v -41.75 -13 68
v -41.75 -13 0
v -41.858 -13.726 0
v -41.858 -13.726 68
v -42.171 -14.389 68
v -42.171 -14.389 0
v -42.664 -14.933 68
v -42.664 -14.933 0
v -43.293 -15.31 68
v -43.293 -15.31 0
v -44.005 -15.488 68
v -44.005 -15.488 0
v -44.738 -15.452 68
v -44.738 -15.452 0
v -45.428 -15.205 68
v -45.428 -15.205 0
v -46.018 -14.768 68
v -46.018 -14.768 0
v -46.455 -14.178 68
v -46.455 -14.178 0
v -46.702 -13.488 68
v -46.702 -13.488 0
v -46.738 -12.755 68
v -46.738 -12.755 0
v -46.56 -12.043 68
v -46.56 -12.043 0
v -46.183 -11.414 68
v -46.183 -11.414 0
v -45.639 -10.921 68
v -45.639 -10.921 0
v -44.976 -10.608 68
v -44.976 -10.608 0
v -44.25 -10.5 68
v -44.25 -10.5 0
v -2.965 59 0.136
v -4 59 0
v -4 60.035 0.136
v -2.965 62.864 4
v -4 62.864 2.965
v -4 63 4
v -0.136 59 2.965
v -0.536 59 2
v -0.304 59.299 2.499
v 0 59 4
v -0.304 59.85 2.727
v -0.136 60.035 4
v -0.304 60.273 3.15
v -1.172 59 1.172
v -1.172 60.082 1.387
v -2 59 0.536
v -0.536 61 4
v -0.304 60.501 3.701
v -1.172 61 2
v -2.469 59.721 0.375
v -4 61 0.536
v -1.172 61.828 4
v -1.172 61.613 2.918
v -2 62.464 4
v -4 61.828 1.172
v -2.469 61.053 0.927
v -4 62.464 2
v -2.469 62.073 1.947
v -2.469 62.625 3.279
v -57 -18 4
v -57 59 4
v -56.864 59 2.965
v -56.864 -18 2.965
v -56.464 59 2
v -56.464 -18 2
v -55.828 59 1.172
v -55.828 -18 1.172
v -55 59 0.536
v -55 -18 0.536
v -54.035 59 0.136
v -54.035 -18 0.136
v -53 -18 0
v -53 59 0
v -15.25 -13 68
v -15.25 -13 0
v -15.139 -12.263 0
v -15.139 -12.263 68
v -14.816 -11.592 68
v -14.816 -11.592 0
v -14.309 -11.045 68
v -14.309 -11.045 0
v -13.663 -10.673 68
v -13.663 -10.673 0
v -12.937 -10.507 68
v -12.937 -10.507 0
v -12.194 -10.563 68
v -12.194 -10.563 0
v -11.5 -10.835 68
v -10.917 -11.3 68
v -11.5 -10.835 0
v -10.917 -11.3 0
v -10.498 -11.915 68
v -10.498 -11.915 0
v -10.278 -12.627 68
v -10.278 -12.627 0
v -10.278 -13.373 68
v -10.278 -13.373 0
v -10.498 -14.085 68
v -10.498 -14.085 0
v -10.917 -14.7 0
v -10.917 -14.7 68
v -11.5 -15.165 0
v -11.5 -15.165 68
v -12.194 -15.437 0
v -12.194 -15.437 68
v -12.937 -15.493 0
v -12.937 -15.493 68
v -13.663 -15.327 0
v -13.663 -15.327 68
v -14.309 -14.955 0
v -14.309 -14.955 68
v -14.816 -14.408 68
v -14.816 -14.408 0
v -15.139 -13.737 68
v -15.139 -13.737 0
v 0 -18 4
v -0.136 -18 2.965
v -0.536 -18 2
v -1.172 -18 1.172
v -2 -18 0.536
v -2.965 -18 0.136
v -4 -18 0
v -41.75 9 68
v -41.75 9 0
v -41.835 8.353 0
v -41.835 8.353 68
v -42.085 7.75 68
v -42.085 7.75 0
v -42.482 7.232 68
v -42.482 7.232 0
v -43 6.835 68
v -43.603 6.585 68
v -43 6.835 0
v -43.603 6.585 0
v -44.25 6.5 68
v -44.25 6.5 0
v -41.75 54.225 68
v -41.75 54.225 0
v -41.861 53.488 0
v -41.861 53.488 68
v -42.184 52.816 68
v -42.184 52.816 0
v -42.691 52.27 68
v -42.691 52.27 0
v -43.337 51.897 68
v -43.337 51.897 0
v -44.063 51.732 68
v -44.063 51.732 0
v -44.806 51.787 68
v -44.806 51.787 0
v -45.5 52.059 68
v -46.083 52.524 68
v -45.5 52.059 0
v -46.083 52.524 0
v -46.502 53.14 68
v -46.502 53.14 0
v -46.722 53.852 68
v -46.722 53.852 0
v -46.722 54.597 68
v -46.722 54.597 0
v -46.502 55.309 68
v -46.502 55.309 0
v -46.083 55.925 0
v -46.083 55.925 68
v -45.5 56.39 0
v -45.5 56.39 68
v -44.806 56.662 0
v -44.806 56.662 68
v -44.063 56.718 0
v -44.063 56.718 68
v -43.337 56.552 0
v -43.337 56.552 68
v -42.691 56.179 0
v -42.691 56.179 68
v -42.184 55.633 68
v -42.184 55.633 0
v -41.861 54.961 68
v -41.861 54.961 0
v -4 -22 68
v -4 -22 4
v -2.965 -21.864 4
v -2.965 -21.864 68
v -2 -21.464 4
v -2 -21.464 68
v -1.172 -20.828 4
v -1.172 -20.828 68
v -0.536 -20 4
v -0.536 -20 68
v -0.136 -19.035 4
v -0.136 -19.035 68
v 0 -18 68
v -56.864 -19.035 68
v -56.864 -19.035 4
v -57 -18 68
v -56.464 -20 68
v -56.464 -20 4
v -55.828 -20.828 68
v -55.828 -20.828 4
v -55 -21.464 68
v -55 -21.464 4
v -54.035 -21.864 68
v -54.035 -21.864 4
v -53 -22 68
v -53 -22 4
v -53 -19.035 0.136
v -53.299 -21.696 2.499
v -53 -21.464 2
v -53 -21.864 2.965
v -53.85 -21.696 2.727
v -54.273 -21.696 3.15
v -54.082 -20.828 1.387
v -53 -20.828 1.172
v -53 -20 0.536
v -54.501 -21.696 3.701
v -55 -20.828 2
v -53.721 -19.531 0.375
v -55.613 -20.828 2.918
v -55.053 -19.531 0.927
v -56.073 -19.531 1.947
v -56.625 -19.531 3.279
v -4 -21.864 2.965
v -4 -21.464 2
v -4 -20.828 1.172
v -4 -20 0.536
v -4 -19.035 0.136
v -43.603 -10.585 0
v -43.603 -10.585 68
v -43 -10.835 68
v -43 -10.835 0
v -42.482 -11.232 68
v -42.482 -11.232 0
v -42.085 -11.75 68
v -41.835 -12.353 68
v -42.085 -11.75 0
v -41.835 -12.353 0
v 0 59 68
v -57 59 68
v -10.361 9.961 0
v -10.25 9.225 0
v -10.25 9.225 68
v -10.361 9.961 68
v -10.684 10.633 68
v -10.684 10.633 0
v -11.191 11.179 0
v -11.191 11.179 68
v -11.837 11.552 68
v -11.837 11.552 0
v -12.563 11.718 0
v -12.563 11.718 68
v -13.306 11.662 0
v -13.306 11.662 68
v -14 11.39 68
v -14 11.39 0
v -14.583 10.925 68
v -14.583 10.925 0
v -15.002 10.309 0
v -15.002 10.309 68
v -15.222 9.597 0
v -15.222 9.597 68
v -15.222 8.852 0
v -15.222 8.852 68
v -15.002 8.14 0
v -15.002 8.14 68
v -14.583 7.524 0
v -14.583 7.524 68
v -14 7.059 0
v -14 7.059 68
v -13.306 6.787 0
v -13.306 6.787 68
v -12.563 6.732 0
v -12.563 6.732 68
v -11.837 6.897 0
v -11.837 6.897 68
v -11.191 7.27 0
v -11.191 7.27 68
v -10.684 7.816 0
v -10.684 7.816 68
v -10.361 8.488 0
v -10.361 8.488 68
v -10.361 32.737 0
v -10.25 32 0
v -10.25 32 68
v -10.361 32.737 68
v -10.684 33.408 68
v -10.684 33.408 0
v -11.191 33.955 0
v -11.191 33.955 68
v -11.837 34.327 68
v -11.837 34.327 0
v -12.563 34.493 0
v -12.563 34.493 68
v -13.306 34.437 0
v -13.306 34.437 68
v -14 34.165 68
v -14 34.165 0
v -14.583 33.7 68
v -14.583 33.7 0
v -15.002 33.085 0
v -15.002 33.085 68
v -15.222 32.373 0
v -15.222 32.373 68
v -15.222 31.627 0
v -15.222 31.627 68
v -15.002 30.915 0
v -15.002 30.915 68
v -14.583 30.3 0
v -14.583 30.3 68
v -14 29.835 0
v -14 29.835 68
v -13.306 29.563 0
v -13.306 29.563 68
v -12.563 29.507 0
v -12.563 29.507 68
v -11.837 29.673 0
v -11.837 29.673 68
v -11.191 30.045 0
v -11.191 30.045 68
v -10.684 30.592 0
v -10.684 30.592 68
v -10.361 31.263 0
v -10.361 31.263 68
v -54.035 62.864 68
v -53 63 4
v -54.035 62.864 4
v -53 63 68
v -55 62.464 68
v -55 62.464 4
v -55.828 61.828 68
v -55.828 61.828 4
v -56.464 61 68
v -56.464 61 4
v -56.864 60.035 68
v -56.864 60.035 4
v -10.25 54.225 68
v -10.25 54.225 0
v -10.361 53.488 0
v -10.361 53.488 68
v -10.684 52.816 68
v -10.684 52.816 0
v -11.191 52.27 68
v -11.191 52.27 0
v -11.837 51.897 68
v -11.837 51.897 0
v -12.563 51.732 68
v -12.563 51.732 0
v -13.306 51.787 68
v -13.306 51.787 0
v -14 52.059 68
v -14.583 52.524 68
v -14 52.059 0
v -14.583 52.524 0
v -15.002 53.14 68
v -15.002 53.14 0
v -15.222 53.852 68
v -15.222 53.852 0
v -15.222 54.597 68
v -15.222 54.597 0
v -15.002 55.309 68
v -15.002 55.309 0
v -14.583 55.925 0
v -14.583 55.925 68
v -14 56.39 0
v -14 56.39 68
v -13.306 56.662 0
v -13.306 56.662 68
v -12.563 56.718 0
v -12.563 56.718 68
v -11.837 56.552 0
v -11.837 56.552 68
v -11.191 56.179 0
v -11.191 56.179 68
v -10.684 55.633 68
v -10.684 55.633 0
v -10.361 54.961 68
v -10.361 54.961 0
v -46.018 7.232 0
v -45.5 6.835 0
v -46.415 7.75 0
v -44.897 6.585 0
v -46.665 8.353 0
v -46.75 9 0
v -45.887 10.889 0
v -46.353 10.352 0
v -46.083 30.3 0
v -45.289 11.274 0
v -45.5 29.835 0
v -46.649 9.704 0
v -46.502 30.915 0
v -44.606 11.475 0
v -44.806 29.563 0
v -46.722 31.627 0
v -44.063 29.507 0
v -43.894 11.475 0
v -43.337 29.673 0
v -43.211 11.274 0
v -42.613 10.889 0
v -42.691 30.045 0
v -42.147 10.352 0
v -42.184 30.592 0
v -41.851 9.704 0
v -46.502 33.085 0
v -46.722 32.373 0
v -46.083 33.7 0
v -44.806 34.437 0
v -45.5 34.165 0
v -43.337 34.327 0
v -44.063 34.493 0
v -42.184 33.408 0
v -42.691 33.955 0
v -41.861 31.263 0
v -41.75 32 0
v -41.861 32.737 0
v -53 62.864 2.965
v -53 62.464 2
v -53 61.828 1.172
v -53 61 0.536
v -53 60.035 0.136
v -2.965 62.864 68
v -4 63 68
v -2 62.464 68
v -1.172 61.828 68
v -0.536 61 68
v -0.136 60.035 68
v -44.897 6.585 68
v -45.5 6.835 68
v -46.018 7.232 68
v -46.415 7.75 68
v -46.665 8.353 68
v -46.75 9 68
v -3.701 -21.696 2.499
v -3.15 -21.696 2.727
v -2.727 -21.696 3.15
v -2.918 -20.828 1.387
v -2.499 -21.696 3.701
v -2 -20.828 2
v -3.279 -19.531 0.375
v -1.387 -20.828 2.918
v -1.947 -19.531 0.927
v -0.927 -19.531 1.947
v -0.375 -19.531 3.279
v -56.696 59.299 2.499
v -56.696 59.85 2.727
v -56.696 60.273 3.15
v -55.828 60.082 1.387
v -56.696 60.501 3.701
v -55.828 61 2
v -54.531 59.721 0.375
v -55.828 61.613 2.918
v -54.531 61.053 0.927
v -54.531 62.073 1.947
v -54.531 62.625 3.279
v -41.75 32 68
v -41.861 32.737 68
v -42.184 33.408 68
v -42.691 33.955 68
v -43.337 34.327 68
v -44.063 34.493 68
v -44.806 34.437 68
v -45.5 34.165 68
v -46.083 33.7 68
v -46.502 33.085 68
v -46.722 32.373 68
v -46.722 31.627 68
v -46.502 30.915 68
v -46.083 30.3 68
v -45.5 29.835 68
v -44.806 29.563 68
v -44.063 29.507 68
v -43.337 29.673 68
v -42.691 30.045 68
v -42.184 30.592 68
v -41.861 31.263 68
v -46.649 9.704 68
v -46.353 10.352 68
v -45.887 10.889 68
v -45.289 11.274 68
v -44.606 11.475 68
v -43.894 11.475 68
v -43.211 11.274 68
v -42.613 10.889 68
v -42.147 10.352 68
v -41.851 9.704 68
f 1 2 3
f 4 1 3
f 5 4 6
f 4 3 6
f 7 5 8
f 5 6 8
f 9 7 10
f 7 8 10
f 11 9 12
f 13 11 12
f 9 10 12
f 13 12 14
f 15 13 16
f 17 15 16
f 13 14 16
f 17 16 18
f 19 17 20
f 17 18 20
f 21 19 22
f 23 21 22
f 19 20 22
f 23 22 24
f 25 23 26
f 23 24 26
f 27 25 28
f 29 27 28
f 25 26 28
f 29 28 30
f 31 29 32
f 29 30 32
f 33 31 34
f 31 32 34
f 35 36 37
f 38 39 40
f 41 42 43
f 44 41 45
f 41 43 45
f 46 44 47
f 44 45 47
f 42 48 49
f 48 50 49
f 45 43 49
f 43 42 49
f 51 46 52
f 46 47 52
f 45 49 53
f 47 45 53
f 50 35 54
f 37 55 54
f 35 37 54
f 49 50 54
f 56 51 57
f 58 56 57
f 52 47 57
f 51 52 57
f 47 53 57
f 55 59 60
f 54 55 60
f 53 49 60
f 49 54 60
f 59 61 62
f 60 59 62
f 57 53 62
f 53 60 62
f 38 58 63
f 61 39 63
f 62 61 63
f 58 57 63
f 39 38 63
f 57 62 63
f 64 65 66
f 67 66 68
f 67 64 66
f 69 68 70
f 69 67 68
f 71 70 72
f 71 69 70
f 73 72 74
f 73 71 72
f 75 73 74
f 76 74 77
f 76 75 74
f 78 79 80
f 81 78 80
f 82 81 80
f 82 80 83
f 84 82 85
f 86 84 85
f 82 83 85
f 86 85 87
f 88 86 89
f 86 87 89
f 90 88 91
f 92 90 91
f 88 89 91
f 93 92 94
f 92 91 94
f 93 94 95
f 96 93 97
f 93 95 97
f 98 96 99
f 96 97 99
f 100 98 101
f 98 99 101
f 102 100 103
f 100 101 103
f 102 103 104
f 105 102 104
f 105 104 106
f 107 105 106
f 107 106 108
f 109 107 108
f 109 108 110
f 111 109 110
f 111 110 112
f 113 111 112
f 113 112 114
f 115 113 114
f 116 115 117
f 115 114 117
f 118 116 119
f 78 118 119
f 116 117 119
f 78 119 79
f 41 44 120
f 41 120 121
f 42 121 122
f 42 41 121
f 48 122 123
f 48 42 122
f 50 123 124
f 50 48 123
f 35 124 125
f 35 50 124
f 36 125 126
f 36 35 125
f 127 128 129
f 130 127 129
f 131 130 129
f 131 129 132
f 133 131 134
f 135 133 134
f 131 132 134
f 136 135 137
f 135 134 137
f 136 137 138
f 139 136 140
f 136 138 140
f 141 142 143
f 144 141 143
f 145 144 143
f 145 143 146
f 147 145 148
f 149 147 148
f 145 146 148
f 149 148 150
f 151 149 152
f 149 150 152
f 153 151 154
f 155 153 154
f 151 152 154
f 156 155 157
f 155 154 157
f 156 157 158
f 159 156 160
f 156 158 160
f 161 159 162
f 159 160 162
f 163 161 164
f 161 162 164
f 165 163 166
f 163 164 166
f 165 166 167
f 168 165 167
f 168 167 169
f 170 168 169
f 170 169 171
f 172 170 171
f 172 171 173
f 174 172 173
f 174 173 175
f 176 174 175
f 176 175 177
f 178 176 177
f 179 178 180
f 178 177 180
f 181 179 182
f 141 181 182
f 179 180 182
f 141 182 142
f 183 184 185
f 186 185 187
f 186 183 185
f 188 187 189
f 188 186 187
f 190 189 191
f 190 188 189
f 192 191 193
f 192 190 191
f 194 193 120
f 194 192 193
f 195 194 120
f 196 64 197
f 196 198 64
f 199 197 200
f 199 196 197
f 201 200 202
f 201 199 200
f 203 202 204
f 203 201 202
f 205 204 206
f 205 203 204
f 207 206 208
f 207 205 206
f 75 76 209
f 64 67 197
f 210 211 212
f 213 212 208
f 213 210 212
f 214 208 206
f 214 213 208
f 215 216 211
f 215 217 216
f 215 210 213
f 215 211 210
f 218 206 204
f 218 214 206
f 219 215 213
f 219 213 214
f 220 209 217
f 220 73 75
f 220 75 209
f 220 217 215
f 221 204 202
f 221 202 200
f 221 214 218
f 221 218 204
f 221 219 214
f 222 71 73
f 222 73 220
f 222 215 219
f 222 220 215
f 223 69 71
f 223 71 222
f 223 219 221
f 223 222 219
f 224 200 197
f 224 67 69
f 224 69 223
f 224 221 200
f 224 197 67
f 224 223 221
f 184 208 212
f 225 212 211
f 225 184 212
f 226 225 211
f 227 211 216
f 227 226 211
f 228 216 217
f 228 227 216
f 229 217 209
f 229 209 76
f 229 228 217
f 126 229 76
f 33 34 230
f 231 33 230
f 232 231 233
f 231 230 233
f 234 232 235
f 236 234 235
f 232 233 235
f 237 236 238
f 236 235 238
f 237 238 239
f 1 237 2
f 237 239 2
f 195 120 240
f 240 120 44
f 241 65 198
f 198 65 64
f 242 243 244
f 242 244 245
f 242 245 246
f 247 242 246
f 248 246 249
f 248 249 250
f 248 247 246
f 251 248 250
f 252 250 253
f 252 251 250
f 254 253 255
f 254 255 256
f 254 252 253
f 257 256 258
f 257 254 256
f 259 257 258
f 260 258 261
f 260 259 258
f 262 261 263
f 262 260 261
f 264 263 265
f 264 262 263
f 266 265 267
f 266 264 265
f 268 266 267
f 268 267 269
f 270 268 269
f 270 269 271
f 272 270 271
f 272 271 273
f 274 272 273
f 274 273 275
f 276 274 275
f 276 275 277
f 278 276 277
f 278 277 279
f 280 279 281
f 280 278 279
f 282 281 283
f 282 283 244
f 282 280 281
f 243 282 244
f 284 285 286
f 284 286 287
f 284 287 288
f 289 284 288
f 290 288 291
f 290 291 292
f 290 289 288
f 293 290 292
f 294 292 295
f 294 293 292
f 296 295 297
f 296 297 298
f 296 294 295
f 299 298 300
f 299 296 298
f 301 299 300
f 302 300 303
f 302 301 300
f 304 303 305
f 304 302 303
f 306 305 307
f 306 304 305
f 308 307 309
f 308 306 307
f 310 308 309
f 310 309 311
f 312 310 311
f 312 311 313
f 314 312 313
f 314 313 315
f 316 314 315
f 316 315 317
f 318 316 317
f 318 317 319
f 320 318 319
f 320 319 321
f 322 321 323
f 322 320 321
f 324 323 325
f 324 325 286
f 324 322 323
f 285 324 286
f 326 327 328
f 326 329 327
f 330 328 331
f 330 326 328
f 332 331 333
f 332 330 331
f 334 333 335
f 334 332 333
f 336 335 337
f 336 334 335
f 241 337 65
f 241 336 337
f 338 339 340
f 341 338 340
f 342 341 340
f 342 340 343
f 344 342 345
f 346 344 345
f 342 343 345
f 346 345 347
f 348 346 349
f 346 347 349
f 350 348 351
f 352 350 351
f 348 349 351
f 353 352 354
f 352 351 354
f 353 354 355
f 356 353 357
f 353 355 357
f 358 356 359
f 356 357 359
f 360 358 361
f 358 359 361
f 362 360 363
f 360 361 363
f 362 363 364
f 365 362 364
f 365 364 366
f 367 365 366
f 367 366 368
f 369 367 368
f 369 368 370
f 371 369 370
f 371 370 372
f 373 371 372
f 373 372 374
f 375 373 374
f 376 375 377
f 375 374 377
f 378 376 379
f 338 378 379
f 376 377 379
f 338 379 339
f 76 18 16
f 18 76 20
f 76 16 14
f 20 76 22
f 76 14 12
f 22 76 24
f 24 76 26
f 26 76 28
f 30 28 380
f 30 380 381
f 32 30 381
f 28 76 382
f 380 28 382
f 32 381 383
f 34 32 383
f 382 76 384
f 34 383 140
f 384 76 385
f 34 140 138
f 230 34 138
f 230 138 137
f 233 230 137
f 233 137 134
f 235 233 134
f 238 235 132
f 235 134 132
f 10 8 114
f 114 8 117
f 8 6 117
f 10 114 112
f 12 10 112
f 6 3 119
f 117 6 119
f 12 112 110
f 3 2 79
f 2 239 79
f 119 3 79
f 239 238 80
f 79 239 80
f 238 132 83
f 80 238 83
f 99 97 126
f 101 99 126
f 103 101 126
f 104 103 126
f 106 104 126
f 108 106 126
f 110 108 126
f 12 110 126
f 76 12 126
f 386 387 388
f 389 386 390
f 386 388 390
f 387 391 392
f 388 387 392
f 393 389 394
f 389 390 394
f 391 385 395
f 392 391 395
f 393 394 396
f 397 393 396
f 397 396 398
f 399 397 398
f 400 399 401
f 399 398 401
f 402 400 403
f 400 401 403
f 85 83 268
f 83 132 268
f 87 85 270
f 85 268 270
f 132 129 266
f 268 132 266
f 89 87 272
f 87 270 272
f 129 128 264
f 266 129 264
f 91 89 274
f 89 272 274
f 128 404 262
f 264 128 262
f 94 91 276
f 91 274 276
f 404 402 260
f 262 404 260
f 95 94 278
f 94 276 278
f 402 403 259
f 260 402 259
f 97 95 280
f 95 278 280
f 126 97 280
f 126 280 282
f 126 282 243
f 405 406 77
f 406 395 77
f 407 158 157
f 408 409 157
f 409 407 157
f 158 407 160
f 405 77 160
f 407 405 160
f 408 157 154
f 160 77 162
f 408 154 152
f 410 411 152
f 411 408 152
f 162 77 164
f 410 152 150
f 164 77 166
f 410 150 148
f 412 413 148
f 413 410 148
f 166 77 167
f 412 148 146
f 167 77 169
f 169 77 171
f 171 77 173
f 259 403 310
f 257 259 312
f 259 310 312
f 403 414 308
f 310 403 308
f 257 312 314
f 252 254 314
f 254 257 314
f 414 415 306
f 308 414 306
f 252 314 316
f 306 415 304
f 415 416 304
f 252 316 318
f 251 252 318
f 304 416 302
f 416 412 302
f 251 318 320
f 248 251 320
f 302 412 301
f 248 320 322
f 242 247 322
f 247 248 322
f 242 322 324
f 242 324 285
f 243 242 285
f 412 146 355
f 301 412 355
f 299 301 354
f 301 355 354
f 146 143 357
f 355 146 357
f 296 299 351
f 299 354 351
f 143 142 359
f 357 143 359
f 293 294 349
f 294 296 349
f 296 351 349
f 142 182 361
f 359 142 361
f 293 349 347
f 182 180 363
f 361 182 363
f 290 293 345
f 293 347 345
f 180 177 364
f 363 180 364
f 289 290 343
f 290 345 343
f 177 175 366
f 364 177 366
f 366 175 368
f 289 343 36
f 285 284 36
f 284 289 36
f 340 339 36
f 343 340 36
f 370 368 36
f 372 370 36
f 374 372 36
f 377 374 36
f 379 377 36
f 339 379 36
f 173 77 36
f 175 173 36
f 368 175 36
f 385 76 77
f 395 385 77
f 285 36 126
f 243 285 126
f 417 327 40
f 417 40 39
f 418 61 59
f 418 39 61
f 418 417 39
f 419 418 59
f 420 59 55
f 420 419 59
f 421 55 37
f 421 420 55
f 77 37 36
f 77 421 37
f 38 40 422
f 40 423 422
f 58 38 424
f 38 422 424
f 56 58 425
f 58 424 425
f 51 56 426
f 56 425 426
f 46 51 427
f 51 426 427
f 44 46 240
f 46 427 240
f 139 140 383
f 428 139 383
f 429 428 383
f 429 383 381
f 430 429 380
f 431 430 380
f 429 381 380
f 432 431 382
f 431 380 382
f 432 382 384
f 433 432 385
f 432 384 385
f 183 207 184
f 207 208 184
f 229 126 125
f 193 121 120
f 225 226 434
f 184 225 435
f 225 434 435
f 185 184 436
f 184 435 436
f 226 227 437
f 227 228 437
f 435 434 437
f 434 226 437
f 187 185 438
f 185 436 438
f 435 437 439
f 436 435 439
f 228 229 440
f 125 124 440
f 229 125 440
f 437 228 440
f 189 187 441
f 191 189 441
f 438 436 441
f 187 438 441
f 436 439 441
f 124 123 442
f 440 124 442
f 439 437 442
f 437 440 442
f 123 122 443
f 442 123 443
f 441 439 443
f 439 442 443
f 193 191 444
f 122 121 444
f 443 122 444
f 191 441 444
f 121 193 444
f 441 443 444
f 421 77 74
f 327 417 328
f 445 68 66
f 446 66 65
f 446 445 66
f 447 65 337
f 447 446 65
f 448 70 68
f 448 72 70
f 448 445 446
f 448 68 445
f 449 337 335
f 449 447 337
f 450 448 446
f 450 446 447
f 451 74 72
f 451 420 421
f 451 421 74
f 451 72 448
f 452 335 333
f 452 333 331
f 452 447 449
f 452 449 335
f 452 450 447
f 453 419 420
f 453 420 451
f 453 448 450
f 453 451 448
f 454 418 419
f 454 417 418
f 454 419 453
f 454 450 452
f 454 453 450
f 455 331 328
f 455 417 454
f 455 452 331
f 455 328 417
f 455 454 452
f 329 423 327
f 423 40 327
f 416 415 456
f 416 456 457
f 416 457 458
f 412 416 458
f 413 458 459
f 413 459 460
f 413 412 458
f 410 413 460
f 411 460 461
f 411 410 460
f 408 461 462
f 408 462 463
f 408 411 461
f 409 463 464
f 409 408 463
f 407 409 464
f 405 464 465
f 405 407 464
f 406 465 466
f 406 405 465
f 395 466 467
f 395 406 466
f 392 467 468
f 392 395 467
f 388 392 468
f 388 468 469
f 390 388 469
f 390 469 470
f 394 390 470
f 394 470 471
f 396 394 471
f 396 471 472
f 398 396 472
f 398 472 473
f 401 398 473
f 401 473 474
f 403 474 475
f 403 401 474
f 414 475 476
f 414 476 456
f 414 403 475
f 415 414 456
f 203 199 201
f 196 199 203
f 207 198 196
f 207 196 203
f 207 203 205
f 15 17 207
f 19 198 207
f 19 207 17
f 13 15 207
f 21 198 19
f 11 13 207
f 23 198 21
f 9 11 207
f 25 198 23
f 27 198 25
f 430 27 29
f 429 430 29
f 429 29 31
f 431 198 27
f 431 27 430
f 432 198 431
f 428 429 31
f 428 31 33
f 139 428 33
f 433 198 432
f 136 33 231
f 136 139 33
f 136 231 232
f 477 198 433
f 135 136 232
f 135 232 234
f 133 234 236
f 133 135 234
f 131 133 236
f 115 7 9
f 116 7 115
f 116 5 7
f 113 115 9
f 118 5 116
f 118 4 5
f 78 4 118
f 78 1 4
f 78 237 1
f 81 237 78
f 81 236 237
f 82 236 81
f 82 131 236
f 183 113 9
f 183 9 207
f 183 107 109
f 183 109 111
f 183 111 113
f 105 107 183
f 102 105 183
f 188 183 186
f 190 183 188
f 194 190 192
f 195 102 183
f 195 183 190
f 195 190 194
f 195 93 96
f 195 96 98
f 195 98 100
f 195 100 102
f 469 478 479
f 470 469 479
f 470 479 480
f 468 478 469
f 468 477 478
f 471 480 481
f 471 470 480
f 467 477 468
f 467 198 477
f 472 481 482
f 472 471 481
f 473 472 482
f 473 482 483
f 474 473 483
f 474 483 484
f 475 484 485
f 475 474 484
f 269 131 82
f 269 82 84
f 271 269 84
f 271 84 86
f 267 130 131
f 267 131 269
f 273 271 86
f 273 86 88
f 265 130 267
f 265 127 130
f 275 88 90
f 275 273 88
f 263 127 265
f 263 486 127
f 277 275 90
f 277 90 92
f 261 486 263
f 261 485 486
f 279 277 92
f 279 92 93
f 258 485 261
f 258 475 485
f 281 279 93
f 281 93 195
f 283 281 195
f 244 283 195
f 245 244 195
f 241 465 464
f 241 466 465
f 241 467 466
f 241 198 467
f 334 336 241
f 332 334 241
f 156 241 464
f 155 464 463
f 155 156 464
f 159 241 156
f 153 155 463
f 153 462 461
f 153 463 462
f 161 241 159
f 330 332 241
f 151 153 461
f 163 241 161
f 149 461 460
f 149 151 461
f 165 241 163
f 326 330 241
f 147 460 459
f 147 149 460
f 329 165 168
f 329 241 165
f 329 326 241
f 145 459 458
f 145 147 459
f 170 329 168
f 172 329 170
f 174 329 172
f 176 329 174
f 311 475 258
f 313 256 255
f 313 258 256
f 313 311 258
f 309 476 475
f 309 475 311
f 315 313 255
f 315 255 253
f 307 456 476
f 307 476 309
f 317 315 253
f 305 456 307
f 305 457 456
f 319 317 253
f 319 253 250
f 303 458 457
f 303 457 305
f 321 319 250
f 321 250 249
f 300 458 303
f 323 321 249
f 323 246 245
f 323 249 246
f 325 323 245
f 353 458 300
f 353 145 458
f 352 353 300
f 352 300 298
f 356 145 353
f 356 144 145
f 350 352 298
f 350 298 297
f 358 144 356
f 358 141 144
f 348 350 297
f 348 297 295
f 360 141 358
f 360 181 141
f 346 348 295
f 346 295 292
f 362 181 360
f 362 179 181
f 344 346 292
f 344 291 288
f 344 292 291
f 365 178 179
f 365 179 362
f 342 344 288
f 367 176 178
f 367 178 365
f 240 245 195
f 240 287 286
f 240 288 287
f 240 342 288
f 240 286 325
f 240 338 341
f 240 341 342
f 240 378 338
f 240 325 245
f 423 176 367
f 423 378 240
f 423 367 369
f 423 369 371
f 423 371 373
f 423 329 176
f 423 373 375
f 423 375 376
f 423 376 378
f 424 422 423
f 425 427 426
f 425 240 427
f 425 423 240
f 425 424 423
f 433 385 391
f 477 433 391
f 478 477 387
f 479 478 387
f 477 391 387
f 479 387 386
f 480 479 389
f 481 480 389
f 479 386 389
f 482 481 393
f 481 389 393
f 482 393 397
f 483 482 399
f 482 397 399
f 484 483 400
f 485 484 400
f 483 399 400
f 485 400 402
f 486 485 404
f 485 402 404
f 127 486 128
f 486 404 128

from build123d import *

# Parameters (mm, degrees)
F0_R     = 2.5
F1_DEPTH = 68
F2_R     = 4


with BuildPart() as f1:
    # F0 (on Top) → F1 (new body)
    with BuildSketch(Plane.XY):
        with BuildLine():
            Line((-44.25, -10.5), (-44.25, 0))
            Line((-44.25, 0), (-57, 0))
            Line((-57, 0), (-57, -22))
            Line((-57, -22), (0, -22))
            Line((0, -22), (0, 0))
            Line((0, 0), (-28.5, 0))
            Line((-28.5, 0), (-28.5, -13))
            Line((-28.5, -13), (-41.75, -13))
            ThreePointArc((-41.75, -13), (-46.017766953, -14.767766953), (-44.25, -10.5))
        make_face()
        with BuildLine():
            ThreePointArc((-10.25, -13), (-12.75, -15.5), (-15.25, -13))
            ThreePointArc((-15.25, -13), (-12.75, -10.5), (-10.25, -13))
        make_face(mode=Mode.SUBTRACT)
        with BuildLine():
            Line((-44.25, 6.5), (-44.25, 0))
            Line((-44.25, 0), (-28.5, 0))
            Line((-28.5, 0), (0, 0))
            Line((0, 0), (0, 63))
            Line((0, 63), (-57, 63))
            Line((-57, 63), (-57, 9))
            Line((-57, 9), (-46.75, 9))
            ThreePointArc((-46.75, 9), (-44.25, 11.5), (-41.75, 9))
            ThreePointArc((-41.75, 9), (-42.482233047, 7.232233047), (-44.25, 6.5))
        make_face()
        with Locations((-12.75, 9.2245186158)):
            Circle(F0_R, mode=Mode.SUBTRACT)
        with Locations((-44.25, 32)):
            Circle(F0_R, mode=Mode.SUBTRACT)
        with BuildLine():
            ThreePointArc((-46.75, 54.2245186158), (-44.25, 56.7245186158), (-41.75, 54.2245186158))
            ThreePointArc((-41.75, 54.2245186158), (-44.25, 51.7245186158), (-46.75, 54.2245186158))
        make_face(mode=Mode.SUBTRACT)
        with Locations((-12.75, 32)):
            Circle(F0_R, mode=Mode.SUBTRACT)
        with BuildLine():
            ThreePointArc((-15.25, 54.2245186158), (-12.75, 56.7245186158), (-10.25, 54.2245186158))
            ThreePointArc((-10.25, 54.2245186158), (-12.75, 51.7245186158), (-15.25, 54.2245186158))
        make_face(mode=Mode.SUBTRACT)
        with BuildLine():
            Line((-57, 0), (-44.25, 0))
            Line((-44.25, 0), (-44.25, 6.5))
            ThreePointArc((-44.25, 6.5), (-46.017766953, 7.232233047), (-46.75, 9))
            Line((-46.75, 9), (-57, 9))
            Line((-57, 9), (-57, 0))
        make_face()
        with BuildLine():
            Line((-28.5, 0), (-44.25, 0))
            Line((-44.25, 0), (-44.25, -10.5))
            ThreePointArc((-44.25, -10.5), (-42.482233047, -11.232233047), (-41.75, -13))
            Line((-41.75, -13), (-28.5, -13))
            Line((-28.5, -13), (-28.5, 0))
        make_face()
    extrude(amount=F1_DEPTH)

    # F2
    f2_edges = [f1.edges().sort_by_distance(p)[0] for p in [
        (-28.5, 63, 0),
        (0, 20.5, 0),
        (-57, 20.5, 0),
        (-57, 63, 34),
        (0, 63, 34),
        (-28.5, -22, 0),
        (-57, -22, 34),
        (0, -22, 34),
    ]]
    fillet(f2_edges, radius=F2_R)


solid = f1.part
